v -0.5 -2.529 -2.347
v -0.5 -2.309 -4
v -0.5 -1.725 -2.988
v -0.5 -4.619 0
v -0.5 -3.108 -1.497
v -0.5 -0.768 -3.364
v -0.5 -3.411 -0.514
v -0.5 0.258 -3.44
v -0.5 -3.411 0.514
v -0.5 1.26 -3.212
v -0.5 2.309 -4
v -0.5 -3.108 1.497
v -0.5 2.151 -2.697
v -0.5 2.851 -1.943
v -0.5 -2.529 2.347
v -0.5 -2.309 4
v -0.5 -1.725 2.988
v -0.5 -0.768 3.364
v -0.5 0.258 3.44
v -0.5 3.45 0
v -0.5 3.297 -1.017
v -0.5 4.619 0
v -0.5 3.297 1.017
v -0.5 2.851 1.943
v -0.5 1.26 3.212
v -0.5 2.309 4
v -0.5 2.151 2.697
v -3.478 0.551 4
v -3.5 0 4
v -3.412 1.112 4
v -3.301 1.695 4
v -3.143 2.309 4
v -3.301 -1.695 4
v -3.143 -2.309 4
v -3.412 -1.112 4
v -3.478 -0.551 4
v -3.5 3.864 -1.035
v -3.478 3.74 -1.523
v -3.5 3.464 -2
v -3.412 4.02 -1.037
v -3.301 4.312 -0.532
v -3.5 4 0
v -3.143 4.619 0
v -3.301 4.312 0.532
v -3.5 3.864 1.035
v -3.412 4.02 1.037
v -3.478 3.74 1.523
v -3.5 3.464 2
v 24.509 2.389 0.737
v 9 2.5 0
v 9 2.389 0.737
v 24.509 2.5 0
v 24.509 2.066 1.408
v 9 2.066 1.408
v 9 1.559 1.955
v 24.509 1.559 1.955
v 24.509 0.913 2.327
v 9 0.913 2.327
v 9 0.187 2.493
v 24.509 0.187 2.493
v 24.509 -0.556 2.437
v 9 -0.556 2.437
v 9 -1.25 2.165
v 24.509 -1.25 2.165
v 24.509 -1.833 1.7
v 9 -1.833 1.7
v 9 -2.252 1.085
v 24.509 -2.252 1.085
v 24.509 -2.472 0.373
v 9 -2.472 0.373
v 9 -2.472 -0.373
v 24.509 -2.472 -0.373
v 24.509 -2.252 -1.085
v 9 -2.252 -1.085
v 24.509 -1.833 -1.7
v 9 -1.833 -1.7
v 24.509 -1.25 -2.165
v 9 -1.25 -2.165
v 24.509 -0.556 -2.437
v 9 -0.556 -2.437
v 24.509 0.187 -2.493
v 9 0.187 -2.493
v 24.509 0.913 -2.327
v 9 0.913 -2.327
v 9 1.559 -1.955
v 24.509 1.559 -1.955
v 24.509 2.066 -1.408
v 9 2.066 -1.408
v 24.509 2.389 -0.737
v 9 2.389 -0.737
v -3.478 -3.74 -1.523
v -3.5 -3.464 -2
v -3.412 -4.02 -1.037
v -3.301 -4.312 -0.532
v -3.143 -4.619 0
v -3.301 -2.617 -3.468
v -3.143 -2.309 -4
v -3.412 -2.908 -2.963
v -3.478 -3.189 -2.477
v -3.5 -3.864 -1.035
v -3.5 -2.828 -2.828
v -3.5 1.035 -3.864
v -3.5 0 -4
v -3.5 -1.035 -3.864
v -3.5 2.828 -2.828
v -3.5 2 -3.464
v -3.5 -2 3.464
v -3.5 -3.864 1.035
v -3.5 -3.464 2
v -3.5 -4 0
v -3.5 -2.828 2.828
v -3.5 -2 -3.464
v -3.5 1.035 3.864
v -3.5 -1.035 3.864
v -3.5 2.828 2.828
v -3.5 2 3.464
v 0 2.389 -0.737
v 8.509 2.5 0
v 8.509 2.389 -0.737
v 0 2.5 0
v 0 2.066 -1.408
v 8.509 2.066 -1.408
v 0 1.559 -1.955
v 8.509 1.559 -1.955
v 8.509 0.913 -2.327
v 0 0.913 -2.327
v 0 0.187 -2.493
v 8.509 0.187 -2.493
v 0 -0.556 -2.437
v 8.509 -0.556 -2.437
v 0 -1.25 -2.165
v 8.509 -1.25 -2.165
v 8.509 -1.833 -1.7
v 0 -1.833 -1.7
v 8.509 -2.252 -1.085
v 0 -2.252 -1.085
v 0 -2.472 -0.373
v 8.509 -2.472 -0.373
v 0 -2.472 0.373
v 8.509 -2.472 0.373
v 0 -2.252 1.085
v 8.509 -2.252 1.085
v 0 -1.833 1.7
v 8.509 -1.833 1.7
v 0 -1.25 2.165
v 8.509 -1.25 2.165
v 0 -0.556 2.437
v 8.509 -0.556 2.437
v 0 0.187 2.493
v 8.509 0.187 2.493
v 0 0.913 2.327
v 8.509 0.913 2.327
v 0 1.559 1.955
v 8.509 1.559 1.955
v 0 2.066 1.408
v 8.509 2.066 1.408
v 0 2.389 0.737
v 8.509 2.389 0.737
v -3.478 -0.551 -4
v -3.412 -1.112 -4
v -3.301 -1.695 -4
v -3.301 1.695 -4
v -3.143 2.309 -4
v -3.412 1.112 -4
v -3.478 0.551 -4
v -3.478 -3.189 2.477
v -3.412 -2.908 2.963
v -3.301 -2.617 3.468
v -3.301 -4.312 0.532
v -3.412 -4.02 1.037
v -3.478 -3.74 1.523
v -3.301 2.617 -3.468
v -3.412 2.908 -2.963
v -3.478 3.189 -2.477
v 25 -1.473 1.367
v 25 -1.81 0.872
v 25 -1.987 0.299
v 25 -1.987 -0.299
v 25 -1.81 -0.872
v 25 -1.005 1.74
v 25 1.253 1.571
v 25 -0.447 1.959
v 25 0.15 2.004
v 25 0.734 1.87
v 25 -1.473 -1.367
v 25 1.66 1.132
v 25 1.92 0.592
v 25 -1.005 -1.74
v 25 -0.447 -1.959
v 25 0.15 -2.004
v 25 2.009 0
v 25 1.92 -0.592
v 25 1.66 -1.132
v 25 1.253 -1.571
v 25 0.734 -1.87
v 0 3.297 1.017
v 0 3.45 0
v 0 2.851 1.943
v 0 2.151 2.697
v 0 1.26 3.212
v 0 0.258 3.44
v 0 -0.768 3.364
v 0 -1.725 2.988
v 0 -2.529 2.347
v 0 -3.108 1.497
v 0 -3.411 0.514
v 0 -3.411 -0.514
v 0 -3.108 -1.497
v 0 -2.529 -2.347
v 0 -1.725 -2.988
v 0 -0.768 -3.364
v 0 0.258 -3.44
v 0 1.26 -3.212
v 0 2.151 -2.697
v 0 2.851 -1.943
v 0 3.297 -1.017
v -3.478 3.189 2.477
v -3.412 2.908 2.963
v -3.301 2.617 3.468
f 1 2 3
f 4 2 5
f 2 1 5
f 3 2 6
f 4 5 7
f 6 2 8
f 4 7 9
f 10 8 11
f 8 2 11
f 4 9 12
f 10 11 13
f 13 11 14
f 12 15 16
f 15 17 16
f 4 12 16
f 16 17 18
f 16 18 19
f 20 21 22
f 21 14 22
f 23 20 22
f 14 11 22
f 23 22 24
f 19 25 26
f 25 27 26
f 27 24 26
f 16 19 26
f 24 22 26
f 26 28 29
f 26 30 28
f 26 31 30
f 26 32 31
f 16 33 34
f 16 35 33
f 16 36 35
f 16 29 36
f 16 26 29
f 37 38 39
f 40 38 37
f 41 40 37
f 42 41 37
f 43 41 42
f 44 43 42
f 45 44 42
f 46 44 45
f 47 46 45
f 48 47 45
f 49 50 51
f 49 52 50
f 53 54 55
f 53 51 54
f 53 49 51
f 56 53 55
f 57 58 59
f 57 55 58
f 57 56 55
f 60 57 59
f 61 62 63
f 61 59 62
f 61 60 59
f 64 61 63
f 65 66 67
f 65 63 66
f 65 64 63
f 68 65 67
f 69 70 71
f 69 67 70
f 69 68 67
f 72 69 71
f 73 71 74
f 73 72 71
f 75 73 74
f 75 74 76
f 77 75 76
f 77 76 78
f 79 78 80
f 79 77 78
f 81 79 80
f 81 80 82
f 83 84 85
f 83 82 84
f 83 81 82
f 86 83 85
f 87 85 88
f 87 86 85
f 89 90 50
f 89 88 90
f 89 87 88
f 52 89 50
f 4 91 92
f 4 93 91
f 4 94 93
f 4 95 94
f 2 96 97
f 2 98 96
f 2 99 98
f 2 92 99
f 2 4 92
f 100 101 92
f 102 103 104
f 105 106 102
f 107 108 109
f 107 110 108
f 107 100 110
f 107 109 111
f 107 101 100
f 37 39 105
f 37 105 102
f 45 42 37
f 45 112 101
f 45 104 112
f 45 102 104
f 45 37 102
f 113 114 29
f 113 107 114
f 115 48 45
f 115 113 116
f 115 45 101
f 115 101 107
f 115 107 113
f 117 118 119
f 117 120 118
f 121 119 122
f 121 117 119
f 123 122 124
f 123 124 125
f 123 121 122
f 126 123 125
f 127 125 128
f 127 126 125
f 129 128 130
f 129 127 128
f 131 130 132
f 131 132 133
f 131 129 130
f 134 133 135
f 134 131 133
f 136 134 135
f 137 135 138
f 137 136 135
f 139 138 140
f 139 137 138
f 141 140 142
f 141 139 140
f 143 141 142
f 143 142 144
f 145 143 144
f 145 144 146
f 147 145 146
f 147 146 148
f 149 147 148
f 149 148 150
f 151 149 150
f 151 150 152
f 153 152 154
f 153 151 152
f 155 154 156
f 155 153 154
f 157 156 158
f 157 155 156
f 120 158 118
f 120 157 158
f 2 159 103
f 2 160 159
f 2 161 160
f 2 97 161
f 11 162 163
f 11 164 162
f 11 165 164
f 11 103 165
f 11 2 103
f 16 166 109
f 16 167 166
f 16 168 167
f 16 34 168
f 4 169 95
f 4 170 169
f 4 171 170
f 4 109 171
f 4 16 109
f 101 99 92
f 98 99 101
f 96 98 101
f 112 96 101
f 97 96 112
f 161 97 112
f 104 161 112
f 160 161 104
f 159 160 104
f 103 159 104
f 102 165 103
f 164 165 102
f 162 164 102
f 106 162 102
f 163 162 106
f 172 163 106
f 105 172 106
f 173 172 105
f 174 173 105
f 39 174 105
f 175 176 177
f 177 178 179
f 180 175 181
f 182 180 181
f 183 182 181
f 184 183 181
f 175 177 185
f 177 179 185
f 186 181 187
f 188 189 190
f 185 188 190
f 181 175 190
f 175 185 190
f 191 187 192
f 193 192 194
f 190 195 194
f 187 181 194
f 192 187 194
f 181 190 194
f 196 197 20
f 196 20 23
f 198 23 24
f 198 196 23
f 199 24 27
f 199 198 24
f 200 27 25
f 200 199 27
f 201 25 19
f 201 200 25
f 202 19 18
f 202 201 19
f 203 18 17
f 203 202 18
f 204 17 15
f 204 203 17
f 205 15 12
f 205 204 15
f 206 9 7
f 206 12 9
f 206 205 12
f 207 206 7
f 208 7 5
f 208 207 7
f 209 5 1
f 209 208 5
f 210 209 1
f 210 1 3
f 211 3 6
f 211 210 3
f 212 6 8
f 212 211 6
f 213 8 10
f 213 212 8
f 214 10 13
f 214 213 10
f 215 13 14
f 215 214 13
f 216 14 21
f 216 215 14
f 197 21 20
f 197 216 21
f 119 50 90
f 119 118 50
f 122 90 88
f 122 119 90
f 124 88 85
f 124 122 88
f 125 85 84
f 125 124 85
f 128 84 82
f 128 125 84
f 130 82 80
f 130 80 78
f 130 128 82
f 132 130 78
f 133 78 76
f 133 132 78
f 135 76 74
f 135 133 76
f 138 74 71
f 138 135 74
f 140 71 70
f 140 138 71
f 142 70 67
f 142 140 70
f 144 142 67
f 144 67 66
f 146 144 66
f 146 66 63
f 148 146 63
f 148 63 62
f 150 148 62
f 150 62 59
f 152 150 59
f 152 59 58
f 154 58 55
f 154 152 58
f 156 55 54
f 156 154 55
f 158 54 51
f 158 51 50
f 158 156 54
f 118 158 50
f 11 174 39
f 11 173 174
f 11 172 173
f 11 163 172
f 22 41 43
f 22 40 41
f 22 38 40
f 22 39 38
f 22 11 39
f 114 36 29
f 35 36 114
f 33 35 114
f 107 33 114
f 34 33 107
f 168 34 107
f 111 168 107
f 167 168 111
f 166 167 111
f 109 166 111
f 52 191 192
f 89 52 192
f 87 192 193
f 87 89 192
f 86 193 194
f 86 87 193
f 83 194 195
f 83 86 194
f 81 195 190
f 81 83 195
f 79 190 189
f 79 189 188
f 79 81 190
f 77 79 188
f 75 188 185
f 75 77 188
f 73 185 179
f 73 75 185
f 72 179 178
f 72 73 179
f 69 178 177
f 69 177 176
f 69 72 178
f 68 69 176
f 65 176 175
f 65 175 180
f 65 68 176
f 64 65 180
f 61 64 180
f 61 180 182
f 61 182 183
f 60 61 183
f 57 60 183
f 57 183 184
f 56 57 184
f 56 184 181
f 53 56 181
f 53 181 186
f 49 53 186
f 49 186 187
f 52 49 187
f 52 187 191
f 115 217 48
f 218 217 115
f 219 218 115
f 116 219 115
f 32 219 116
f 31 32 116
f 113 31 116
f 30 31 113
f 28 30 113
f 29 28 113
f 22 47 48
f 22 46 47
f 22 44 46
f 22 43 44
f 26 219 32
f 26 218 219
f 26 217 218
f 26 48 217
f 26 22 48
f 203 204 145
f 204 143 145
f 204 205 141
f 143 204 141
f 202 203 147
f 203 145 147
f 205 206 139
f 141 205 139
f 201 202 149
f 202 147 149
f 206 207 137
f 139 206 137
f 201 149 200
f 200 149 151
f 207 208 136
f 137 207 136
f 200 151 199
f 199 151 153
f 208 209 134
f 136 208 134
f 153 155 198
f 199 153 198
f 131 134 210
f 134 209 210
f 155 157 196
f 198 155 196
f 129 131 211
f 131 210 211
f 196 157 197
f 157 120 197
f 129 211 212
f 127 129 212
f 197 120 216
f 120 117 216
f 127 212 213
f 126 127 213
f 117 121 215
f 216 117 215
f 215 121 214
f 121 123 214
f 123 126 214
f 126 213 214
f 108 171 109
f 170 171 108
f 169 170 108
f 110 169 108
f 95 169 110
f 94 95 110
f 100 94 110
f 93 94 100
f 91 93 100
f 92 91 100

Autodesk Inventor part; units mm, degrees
ref_plane "YZ Plane" through (0, 0, 0) normal (1, 0, 0) x (0, 1, 0)
ref_plane "XZ Plane" through (0, 0, 0) normal (0, 1, 0) x (-1, 0, 0)
sketch "Skizze1" plane through (0, 0, 0) normal (0, 0, 1) x (1, 0, 0)
  line L0 (0, 3.45) -> (0, 2.5)
  line L1 (9, 2.5) -> (25, 2.5)
  line L2 (25, 2.5) -> (25, 0)
  line L3 (25, 0) -> (-0.5001, 0)
  line L4 (-5.6001, 0) -> (30.1, 0) projected
  line L5 (-0.5001, 0) -> (-0.5001, 3.45)
  line L6 (-0.5001, 3.45) -> (0, 3.45)
  line L7 (9, 2.5) -> (8.5091, 2.5)
  line L8 (8.5091, 2.5) -> (0, 2.5)
  line L9 (0, -0.69) -> (0, 4.14) projected
  dimension "d0" = 25
  dimension "d1" = 16
  dimension "d2" = 5
  dimension "d9" = 0.5001
  dimension "d10" = 6.9
  dimension "d13" = 0.4909
  dimension "d14" = 5
revolve "Körper" add sketch "Skizze1" angle 360 about axis through (25, 0, 0) along (-1, 0, 0)
sketch "Skizze2" plane through (-0.5001, 0, 0) normal (-1, 0, 0) x (0, 0, 1)
  line L0 (0, 4.6188) -> (4, 2.3094)
  line L1 (4, 2.3094) -> (4, -2.3094)
  line L2 (4, -2.3094) -> (0, -4.6188)
  line L3 (0, -4.6188) -> (-4, -2.3094)
  line L4 (-4, -2.3094) -> (-4, 2.3094)
  line L5 (-4, 2.3094) -> (0, 4.6188)
  point P0 (0, 0)
  point P1 (0, 0)
  dimension "d11" = 8
extrude "Kopf" add sketch "Skizze2" along normal blind 3
sketch "Skizze4" plane through (0, 0, 0) normal (0, 0, 1) x (1, 0, 0)
  line L0 (-3.5001, 4) -> (-3.5001, 4.6188)
  line L1 (-3.5001, 4.6188) -> (-3.1428, 4.6188)
  line L2 (-3.1428, 4.6188) -> (-3.5001, 4)
  line L3 (-4.1001, 0) -> (0.0999, 0) projected
  line L4 (-0.5001, 4.6188) -> (-3.5001, 4.6188) projected
  line L5 (-3.5001, 2.3094) -> (-3.5001, 4.6188) projected
  dimension "d5" = 30
  dimension "d19" = 8
revolve "Fase1" cut sketch "Skizze4" angle 360 about axis through (-10, 0, 0) along (1, 0, 0)
thread "Gewinde" size "M5x0.8" class "6g" standard "ISO Metric profile" length 16
chamfer "Fase2" distance 0.4908 distance2 0.4909 1 edges at (25, -2.5, 0) measured on face at (25, 0.7379, -0.3873)
ref_plane "Work Plane1" through (1.525, 0, 0) normal (0, 0, 1) x (1, 0, 0)
equation "\"d0\" = NLG"
equation "\"d1\" = GEL"
equation "\"d2\" = GD"
equation "\"d10\" = SD2"
equation "\"d14\" = BDM"
equation "\"d11\" = SW"
equation "\"d3\" = KOH - SD"
equation "\"d5\" = ANG1"
equation "\"d19\" = SW0"
equation "\"d15\" = GEL"
equation "\"d6\" = -0.5 * SPD + 0.5 * GD"
equation "\"NLG\" = 25"
equation "\"GD\" = NND"
equation "\"BDM\" = NND"
equation "\"KOH\" = 3.5"
equation "\"GEL\" = 16"
equation "\"SW\" = 8"
equation "\"SW0\" = SW"
equation "\"SPD\" = NND - 1.2269 * PTC"
equation "\"SD2\" = 6.9"
equation "\"SD\" = 0.5"
equation "\"ANG1\" = 30deg"
equation "\"GAL\" = 0.61345 * PTC"
equation "\"GUL\" = 0.61345 * PTC"
equation "\"RR\" = 0.2"
equation "\"GD1\" = THREADDIA - 1.2269 * PTC"
equation "\"THREADDIA\" = 5"
equation "\"TOA\" = 30deg"
equation "\"PTC\" = 0.8"
equation "\"NND\" = 5"
equation "\"E0\" = 1.155 * SW"
properties part number "DIN 931-1 - M5 x 25" material "Stahl, weich"
